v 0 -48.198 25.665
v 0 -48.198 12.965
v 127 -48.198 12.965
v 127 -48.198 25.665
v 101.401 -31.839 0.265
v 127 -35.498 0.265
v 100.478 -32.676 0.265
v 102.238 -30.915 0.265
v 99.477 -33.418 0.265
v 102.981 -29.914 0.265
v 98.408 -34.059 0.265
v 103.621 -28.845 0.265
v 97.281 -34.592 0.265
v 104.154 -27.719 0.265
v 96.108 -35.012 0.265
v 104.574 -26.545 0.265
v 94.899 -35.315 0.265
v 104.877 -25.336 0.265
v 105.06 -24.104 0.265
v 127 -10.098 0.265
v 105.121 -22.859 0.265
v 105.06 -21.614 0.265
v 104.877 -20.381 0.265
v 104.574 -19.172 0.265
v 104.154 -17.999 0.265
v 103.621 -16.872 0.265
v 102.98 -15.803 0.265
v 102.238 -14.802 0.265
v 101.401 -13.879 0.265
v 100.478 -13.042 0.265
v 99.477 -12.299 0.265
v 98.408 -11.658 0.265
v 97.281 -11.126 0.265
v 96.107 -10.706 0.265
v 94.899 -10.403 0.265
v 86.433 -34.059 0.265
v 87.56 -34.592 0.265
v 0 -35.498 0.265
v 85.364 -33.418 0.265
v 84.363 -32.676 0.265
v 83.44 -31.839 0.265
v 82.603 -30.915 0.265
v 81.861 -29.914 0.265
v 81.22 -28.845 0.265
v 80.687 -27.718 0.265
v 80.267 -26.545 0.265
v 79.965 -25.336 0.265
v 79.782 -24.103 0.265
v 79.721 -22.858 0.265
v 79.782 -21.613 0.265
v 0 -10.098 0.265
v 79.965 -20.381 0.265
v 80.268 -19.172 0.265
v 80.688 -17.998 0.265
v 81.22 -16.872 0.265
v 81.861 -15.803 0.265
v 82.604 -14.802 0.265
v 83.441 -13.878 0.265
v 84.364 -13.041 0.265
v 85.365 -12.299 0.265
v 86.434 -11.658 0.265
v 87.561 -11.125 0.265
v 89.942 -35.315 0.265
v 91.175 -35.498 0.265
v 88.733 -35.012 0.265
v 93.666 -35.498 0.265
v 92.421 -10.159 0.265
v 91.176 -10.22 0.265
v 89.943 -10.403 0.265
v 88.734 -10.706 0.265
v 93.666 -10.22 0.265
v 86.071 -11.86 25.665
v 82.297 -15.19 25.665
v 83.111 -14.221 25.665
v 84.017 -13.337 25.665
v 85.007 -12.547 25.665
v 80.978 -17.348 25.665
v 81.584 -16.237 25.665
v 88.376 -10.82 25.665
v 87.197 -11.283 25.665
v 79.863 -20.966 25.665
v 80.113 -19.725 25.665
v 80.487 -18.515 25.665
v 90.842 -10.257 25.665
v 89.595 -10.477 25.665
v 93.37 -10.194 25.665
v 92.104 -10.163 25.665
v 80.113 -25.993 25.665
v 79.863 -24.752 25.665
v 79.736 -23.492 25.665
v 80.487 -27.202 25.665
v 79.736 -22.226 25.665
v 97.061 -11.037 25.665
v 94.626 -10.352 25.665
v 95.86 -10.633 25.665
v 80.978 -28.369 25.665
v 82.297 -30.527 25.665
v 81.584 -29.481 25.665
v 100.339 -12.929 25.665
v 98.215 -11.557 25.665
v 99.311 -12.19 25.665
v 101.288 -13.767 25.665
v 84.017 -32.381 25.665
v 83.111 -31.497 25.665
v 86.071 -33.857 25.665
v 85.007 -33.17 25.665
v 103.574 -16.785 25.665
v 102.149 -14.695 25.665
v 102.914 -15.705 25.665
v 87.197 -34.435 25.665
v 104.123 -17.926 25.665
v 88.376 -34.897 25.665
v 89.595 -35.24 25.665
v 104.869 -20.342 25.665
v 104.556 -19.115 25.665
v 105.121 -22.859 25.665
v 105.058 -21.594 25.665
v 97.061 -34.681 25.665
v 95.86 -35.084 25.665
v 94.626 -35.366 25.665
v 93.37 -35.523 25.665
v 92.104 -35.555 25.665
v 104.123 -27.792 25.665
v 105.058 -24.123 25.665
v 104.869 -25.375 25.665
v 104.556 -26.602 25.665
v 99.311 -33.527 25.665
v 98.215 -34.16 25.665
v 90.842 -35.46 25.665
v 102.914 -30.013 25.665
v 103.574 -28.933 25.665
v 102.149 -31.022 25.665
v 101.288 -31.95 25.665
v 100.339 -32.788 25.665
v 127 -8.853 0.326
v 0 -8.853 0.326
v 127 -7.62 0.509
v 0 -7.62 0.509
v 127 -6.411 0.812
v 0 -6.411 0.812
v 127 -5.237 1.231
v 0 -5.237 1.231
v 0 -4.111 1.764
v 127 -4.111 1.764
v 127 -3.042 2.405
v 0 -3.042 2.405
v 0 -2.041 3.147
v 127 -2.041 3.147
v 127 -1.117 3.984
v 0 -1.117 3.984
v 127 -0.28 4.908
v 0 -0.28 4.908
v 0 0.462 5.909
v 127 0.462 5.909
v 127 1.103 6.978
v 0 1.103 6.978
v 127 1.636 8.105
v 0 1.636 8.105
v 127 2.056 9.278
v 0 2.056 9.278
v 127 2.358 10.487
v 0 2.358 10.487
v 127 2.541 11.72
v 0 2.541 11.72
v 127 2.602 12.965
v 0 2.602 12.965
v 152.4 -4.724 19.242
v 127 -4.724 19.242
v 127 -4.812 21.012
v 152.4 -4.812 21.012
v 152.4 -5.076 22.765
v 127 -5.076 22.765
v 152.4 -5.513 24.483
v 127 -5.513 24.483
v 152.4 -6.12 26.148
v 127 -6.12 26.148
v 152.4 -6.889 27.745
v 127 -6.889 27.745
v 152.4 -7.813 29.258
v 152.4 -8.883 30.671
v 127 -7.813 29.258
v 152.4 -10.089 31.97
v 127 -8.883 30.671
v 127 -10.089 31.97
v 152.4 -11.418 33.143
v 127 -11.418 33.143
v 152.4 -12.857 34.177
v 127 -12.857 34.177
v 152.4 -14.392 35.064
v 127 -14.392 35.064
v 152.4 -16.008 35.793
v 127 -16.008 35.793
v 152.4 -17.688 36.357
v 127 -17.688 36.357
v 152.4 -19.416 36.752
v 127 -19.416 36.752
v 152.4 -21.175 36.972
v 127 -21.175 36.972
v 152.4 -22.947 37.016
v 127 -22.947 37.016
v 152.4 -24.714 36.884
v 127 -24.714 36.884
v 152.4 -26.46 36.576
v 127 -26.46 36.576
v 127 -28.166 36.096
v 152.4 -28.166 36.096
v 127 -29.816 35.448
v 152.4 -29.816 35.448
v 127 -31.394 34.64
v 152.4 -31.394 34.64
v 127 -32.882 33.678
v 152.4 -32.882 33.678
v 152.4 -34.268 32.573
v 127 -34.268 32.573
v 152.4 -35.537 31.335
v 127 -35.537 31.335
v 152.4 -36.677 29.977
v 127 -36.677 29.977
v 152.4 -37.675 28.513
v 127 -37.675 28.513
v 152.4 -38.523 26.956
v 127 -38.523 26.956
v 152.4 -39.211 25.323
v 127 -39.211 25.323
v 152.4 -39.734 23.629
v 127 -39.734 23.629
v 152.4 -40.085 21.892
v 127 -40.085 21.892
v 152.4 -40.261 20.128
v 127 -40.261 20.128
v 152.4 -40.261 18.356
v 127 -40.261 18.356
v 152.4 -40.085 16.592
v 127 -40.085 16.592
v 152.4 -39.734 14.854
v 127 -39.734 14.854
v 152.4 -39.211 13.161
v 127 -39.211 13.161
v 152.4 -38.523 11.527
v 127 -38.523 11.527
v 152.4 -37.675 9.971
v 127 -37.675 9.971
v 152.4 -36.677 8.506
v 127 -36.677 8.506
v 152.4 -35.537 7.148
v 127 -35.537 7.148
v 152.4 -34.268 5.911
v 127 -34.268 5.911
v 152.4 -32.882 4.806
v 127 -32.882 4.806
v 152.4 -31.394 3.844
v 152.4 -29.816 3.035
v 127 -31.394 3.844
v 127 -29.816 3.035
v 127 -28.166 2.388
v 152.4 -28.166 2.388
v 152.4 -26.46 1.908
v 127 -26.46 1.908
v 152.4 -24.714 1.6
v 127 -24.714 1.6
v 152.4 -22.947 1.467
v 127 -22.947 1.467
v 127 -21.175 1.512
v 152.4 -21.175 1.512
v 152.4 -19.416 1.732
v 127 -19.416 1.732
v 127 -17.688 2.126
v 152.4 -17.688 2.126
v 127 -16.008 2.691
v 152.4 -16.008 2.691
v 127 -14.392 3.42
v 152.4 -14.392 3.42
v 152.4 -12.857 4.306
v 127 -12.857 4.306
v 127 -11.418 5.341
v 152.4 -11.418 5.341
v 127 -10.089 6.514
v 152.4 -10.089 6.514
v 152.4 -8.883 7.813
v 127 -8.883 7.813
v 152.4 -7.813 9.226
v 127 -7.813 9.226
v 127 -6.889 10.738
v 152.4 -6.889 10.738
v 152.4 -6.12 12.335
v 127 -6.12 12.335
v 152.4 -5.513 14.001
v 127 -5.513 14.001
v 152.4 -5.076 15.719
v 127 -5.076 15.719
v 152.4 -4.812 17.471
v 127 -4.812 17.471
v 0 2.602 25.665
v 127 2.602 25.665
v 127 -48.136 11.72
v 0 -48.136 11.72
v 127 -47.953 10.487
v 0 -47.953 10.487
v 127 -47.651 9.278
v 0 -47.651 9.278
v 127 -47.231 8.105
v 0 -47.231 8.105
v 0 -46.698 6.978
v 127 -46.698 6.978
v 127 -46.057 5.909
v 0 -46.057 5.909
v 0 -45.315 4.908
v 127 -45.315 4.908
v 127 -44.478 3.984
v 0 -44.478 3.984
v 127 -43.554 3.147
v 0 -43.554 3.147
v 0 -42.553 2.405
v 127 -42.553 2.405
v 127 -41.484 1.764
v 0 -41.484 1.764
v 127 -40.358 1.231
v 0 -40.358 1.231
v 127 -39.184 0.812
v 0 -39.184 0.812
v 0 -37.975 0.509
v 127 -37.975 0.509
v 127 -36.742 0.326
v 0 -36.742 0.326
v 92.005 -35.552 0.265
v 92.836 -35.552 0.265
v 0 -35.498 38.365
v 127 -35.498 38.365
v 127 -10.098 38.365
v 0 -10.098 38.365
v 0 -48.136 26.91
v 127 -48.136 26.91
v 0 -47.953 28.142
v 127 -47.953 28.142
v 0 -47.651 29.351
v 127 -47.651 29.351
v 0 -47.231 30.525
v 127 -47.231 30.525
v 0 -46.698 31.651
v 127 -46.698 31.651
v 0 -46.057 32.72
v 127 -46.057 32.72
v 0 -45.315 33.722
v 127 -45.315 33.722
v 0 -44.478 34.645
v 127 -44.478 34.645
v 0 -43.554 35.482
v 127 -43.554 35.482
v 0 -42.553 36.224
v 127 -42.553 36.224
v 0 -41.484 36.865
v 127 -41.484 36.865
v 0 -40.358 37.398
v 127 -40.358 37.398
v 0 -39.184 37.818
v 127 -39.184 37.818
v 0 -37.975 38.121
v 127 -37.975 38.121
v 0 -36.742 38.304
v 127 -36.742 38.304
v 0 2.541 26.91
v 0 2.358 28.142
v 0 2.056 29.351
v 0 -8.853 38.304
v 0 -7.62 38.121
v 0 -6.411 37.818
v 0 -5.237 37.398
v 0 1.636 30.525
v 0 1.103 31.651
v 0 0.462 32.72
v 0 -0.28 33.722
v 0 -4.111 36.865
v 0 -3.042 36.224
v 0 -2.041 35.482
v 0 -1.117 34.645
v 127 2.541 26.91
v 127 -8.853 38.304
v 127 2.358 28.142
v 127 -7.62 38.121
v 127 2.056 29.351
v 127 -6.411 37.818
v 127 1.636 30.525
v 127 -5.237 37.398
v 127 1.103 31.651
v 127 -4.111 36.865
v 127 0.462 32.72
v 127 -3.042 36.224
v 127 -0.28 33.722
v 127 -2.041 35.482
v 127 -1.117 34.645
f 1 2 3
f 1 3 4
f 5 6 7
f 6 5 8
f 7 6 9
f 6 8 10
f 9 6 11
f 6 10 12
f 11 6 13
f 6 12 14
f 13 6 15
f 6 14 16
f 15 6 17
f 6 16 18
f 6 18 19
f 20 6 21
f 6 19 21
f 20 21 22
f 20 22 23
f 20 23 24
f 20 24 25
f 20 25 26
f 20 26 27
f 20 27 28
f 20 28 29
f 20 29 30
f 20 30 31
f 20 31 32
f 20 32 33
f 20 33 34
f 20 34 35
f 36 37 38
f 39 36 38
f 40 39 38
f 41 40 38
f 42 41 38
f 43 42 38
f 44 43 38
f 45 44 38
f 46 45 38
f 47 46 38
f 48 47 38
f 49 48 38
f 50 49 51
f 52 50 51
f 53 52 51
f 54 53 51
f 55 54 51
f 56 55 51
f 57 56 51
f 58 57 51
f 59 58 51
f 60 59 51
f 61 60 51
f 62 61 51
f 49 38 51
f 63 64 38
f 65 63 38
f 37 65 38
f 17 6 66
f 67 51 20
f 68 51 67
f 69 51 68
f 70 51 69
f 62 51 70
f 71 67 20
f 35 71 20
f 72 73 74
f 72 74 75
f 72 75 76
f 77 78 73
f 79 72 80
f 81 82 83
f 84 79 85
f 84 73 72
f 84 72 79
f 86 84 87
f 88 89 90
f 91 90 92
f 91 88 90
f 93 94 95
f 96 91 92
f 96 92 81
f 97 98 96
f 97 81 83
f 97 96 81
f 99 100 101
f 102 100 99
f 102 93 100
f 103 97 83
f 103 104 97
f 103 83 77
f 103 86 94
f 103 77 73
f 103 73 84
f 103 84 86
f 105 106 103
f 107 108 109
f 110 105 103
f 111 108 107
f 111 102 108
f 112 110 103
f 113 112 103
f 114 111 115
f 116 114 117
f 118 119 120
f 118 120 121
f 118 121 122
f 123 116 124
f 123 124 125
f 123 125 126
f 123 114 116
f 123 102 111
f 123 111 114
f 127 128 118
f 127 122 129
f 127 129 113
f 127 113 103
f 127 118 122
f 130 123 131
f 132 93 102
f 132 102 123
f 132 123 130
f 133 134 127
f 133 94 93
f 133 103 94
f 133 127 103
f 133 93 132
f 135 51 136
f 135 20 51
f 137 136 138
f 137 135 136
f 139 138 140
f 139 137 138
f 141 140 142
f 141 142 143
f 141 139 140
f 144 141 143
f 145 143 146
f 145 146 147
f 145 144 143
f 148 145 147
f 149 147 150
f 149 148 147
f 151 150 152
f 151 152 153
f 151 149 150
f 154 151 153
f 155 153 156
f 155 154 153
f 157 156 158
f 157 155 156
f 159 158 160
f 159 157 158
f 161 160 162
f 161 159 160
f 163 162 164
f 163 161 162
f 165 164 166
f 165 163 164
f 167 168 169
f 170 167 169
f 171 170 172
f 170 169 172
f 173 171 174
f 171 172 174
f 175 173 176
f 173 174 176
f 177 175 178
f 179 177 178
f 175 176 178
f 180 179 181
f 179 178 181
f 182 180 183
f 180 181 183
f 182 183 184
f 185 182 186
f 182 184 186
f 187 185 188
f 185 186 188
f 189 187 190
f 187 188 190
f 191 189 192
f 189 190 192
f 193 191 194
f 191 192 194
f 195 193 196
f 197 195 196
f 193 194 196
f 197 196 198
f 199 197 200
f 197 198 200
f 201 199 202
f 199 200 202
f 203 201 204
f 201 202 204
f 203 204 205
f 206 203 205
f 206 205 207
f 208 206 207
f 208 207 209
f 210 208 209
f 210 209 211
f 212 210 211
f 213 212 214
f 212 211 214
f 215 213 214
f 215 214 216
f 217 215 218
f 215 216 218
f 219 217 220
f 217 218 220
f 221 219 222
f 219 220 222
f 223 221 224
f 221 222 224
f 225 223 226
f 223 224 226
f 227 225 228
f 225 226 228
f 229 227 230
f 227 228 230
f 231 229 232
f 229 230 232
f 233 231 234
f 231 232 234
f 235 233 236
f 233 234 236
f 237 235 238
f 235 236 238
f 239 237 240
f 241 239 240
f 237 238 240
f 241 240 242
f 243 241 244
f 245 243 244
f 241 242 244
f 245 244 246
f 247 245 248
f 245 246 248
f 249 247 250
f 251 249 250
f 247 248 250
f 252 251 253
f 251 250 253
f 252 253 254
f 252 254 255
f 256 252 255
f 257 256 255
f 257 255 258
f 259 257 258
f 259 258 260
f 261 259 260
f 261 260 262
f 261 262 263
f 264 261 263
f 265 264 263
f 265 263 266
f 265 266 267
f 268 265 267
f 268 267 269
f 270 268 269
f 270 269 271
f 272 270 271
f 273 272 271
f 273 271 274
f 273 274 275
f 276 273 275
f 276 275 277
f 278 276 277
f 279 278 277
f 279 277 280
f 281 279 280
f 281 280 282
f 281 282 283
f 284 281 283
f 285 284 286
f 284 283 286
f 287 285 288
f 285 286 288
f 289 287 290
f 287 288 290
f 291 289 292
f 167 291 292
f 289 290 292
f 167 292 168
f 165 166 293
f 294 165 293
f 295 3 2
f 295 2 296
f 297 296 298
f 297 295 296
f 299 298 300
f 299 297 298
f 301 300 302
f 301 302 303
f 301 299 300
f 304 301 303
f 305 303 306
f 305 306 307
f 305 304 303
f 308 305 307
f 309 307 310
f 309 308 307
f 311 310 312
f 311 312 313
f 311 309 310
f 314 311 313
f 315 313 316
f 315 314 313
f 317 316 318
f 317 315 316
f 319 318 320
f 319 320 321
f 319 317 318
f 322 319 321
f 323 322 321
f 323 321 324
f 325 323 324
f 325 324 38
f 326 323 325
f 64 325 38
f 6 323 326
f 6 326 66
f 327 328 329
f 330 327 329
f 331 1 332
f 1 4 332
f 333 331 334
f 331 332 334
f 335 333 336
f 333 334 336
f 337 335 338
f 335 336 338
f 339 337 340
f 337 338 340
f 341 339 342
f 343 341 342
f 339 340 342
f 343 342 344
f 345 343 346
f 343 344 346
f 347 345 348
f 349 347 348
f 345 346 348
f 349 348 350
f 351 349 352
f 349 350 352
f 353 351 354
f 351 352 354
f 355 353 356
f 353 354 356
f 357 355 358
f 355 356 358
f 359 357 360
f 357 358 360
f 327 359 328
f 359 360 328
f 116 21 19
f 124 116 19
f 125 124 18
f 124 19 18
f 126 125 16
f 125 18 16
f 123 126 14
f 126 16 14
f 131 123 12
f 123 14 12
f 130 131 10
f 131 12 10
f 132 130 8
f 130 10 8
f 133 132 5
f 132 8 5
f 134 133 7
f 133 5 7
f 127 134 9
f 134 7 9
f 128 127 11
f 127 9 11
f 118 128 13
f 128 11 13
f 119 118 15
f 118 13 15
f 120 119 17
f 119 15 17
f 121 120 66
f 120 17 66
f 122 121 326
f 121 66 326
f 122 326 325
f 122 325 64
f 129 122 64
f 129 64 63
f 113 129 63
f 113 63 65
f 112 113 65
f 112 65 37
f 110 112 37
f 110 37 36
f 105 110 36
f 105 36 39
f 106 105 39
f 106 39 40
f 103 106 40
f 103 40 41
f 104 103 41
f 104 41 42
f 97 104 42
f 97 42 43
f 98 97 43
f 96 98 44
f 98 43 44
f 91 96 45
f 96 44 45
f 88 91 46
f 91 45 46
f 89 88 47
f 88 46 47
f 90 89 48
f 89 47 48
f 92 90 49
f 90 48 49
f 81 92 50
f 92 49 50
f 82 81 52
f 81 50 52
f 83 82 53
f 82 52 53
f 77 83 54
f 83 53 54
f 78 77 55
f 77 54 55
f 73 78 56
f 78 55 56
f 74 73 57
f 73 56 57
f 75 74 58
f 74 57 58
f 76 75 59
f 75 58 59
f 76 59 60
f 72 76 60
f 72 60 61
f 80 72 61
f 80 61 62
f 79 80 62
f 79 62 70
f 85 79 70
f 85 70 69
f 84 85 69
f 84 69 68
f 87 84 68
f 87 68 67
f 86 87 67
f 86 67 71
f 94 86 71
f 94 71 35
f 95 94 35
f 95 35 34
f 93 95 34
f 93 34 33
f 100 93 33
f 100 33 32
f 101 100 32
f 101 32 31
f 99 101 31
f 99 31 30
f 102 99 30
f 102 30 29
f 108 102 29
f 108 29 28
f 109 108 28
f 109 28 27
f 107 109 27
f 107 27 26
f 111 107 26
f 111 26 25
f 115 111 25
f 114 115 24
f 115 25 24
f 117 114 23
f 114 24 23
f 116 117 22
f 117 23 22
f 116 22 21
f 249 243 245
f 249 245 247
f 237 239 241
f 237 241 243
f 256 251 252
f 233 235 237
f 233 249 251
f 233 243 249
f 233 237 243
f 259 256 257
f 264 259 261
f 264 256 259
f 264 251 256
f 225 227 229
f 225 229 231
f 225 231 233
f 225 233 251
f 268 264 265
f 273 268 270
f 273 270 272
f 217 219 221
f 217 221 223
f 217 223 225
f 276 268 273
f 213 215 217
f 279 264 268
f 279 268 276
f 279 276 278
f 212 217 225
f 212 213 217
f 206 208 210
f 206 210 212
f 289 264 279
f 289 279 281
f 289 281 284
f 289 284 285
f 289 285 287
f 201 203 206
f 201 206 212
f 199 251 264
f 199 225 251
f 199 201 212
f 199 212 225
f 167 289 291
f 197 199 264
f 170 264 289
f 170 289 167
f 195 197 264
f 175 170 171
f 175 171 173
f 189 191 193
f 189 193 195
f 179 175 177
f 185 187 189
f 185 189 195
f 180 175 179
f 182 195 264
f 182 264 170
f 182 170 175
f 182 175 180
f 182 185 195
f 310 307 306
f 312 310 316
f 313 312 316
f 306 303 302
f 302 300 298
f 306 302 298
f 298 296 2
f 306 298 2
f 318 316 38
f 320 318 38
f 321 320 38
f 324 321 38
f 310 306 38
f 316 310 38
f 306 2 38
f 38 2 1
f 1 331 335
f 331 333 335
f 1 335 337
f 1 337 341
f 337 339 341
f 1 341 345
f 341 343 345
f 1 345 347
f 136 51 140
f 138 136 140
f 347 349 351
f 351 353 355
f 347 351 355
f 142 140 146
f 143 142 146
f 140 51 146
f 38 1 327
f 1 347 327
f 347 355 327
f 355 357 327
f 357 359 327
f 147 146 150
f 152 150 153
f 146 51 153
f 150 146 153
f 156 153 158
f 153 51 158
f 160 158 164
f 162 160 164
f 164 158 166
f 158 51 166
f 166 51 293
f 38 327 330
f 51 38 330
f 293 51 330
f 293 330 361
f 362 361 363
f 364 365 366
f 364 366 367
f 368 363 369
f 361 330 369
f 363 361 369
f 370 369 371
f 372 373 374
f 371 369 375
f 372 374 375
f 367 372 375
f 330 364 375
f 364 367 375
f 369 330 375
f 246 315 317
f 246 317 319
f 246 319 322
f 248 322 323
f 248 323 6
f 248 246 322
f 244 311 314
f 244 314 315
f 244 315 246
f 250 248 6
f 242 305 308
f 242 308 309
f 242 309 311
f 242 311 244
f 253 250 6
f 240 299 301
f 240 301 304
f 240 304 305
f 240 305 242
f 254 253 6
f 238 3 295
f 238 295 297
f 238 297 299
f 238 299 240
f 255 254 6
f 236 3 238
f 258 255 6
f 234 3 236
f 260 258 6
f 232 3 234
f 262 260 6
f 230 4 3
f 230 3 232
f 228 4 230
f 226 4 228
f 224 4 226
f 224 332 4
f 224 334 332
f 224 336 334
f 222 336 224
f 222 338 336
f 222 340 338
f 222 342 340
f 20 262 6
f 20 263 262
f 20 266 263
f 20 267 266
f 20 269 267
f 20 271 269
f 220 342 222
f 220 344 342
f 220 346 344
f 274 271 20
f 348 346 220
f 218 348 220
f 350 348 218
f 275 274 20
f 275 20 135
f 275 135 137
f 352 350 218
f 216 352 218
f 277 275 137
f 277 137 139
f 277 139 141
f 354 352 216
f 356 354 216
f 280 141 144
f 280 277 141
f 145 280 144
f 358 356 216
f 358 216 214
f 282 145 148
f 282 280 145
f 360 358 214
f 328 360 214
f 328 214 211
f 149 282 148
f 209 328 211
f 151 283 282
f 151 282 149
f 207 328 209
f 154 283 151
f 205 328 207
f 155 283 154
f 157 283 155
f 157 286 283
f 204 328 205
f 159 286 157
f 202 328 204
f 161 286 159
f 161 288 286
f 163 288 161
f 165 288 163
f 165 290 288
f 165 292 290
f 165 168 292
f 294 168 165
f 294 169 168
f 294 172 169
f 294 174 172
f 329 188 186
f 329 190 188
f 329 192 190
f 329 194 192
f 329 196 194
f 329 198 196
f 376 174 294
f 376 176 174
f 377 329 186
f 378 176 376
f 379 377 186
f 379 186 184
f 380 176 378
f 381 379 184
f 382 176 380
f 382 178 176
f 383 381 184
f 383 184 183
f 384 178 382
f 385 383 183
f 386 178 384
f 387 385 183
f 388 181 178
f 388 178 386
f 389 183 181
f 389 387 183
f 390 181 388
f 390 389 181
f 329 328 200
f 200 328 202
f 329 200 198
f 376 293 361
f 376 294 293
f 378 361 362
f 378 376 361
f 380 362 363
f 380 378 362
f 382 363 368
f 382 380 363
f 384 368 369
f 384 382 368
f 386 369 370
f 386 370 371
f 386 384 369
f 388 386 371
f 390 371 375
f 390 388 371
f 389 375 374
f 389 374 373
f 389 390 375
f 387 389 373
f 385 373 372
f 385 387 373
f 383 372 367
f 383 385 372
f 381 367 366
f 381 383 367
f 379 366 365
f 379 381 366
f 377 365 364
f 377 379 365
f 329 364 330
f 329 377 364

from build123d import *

# Parameters (mm, degrees)
F0_W     = 50.8
F0_H     = 38.1
F1_DEPTH = 127
F2_R     = 12.7
F3_R     = 12.7
F4_DEPTH = 25.4
F5_R     = 17.78
F6_DEPTH = 25.4


with BuildPart() as f1:
    # F0 (on Right) → F1 (new body)
    with BuildSketch(Plane.YZ):
        with Locations((-22.797512, 19.314706)):
            Rectangle(F0_W, F0_H)
    extrude(amount=F1_DEPTH)

    # F2
    f2_edges = [f1.edges().sort_by_distance(p)[0] for p in [
        (63.5, -48.197512, 38.364706),
        (63.5, 2.602488, 38.364706),
        (63.5, -48.197512, 0.264706),
        (63.5, 2.602488, 0.264706),
    ]]
    fillet(f2_edges, radius=F2_R)

    # F3 (on face) → F4 (cut)
    with BuildSketch(Plane(origin=(0, 0, 0.264706), x_dir=(1, 0, 0), z_dir=(0, 0, -1))):
        with Locations((92.420697, 22.85873)):
            Circle(F3_R)
    extrude(amount=-F4_DEPTH, mode=Mode.SUBTRACT)

    # F5 (on face) → F6 (join)
    with BuildSketch(Plane.YZ.offset(127)):
        with Locations((-22.503506, 19.241814)):
            Circle(F5_R)
    extrude(amount=F6_DEPTH)


solid = f1.part
